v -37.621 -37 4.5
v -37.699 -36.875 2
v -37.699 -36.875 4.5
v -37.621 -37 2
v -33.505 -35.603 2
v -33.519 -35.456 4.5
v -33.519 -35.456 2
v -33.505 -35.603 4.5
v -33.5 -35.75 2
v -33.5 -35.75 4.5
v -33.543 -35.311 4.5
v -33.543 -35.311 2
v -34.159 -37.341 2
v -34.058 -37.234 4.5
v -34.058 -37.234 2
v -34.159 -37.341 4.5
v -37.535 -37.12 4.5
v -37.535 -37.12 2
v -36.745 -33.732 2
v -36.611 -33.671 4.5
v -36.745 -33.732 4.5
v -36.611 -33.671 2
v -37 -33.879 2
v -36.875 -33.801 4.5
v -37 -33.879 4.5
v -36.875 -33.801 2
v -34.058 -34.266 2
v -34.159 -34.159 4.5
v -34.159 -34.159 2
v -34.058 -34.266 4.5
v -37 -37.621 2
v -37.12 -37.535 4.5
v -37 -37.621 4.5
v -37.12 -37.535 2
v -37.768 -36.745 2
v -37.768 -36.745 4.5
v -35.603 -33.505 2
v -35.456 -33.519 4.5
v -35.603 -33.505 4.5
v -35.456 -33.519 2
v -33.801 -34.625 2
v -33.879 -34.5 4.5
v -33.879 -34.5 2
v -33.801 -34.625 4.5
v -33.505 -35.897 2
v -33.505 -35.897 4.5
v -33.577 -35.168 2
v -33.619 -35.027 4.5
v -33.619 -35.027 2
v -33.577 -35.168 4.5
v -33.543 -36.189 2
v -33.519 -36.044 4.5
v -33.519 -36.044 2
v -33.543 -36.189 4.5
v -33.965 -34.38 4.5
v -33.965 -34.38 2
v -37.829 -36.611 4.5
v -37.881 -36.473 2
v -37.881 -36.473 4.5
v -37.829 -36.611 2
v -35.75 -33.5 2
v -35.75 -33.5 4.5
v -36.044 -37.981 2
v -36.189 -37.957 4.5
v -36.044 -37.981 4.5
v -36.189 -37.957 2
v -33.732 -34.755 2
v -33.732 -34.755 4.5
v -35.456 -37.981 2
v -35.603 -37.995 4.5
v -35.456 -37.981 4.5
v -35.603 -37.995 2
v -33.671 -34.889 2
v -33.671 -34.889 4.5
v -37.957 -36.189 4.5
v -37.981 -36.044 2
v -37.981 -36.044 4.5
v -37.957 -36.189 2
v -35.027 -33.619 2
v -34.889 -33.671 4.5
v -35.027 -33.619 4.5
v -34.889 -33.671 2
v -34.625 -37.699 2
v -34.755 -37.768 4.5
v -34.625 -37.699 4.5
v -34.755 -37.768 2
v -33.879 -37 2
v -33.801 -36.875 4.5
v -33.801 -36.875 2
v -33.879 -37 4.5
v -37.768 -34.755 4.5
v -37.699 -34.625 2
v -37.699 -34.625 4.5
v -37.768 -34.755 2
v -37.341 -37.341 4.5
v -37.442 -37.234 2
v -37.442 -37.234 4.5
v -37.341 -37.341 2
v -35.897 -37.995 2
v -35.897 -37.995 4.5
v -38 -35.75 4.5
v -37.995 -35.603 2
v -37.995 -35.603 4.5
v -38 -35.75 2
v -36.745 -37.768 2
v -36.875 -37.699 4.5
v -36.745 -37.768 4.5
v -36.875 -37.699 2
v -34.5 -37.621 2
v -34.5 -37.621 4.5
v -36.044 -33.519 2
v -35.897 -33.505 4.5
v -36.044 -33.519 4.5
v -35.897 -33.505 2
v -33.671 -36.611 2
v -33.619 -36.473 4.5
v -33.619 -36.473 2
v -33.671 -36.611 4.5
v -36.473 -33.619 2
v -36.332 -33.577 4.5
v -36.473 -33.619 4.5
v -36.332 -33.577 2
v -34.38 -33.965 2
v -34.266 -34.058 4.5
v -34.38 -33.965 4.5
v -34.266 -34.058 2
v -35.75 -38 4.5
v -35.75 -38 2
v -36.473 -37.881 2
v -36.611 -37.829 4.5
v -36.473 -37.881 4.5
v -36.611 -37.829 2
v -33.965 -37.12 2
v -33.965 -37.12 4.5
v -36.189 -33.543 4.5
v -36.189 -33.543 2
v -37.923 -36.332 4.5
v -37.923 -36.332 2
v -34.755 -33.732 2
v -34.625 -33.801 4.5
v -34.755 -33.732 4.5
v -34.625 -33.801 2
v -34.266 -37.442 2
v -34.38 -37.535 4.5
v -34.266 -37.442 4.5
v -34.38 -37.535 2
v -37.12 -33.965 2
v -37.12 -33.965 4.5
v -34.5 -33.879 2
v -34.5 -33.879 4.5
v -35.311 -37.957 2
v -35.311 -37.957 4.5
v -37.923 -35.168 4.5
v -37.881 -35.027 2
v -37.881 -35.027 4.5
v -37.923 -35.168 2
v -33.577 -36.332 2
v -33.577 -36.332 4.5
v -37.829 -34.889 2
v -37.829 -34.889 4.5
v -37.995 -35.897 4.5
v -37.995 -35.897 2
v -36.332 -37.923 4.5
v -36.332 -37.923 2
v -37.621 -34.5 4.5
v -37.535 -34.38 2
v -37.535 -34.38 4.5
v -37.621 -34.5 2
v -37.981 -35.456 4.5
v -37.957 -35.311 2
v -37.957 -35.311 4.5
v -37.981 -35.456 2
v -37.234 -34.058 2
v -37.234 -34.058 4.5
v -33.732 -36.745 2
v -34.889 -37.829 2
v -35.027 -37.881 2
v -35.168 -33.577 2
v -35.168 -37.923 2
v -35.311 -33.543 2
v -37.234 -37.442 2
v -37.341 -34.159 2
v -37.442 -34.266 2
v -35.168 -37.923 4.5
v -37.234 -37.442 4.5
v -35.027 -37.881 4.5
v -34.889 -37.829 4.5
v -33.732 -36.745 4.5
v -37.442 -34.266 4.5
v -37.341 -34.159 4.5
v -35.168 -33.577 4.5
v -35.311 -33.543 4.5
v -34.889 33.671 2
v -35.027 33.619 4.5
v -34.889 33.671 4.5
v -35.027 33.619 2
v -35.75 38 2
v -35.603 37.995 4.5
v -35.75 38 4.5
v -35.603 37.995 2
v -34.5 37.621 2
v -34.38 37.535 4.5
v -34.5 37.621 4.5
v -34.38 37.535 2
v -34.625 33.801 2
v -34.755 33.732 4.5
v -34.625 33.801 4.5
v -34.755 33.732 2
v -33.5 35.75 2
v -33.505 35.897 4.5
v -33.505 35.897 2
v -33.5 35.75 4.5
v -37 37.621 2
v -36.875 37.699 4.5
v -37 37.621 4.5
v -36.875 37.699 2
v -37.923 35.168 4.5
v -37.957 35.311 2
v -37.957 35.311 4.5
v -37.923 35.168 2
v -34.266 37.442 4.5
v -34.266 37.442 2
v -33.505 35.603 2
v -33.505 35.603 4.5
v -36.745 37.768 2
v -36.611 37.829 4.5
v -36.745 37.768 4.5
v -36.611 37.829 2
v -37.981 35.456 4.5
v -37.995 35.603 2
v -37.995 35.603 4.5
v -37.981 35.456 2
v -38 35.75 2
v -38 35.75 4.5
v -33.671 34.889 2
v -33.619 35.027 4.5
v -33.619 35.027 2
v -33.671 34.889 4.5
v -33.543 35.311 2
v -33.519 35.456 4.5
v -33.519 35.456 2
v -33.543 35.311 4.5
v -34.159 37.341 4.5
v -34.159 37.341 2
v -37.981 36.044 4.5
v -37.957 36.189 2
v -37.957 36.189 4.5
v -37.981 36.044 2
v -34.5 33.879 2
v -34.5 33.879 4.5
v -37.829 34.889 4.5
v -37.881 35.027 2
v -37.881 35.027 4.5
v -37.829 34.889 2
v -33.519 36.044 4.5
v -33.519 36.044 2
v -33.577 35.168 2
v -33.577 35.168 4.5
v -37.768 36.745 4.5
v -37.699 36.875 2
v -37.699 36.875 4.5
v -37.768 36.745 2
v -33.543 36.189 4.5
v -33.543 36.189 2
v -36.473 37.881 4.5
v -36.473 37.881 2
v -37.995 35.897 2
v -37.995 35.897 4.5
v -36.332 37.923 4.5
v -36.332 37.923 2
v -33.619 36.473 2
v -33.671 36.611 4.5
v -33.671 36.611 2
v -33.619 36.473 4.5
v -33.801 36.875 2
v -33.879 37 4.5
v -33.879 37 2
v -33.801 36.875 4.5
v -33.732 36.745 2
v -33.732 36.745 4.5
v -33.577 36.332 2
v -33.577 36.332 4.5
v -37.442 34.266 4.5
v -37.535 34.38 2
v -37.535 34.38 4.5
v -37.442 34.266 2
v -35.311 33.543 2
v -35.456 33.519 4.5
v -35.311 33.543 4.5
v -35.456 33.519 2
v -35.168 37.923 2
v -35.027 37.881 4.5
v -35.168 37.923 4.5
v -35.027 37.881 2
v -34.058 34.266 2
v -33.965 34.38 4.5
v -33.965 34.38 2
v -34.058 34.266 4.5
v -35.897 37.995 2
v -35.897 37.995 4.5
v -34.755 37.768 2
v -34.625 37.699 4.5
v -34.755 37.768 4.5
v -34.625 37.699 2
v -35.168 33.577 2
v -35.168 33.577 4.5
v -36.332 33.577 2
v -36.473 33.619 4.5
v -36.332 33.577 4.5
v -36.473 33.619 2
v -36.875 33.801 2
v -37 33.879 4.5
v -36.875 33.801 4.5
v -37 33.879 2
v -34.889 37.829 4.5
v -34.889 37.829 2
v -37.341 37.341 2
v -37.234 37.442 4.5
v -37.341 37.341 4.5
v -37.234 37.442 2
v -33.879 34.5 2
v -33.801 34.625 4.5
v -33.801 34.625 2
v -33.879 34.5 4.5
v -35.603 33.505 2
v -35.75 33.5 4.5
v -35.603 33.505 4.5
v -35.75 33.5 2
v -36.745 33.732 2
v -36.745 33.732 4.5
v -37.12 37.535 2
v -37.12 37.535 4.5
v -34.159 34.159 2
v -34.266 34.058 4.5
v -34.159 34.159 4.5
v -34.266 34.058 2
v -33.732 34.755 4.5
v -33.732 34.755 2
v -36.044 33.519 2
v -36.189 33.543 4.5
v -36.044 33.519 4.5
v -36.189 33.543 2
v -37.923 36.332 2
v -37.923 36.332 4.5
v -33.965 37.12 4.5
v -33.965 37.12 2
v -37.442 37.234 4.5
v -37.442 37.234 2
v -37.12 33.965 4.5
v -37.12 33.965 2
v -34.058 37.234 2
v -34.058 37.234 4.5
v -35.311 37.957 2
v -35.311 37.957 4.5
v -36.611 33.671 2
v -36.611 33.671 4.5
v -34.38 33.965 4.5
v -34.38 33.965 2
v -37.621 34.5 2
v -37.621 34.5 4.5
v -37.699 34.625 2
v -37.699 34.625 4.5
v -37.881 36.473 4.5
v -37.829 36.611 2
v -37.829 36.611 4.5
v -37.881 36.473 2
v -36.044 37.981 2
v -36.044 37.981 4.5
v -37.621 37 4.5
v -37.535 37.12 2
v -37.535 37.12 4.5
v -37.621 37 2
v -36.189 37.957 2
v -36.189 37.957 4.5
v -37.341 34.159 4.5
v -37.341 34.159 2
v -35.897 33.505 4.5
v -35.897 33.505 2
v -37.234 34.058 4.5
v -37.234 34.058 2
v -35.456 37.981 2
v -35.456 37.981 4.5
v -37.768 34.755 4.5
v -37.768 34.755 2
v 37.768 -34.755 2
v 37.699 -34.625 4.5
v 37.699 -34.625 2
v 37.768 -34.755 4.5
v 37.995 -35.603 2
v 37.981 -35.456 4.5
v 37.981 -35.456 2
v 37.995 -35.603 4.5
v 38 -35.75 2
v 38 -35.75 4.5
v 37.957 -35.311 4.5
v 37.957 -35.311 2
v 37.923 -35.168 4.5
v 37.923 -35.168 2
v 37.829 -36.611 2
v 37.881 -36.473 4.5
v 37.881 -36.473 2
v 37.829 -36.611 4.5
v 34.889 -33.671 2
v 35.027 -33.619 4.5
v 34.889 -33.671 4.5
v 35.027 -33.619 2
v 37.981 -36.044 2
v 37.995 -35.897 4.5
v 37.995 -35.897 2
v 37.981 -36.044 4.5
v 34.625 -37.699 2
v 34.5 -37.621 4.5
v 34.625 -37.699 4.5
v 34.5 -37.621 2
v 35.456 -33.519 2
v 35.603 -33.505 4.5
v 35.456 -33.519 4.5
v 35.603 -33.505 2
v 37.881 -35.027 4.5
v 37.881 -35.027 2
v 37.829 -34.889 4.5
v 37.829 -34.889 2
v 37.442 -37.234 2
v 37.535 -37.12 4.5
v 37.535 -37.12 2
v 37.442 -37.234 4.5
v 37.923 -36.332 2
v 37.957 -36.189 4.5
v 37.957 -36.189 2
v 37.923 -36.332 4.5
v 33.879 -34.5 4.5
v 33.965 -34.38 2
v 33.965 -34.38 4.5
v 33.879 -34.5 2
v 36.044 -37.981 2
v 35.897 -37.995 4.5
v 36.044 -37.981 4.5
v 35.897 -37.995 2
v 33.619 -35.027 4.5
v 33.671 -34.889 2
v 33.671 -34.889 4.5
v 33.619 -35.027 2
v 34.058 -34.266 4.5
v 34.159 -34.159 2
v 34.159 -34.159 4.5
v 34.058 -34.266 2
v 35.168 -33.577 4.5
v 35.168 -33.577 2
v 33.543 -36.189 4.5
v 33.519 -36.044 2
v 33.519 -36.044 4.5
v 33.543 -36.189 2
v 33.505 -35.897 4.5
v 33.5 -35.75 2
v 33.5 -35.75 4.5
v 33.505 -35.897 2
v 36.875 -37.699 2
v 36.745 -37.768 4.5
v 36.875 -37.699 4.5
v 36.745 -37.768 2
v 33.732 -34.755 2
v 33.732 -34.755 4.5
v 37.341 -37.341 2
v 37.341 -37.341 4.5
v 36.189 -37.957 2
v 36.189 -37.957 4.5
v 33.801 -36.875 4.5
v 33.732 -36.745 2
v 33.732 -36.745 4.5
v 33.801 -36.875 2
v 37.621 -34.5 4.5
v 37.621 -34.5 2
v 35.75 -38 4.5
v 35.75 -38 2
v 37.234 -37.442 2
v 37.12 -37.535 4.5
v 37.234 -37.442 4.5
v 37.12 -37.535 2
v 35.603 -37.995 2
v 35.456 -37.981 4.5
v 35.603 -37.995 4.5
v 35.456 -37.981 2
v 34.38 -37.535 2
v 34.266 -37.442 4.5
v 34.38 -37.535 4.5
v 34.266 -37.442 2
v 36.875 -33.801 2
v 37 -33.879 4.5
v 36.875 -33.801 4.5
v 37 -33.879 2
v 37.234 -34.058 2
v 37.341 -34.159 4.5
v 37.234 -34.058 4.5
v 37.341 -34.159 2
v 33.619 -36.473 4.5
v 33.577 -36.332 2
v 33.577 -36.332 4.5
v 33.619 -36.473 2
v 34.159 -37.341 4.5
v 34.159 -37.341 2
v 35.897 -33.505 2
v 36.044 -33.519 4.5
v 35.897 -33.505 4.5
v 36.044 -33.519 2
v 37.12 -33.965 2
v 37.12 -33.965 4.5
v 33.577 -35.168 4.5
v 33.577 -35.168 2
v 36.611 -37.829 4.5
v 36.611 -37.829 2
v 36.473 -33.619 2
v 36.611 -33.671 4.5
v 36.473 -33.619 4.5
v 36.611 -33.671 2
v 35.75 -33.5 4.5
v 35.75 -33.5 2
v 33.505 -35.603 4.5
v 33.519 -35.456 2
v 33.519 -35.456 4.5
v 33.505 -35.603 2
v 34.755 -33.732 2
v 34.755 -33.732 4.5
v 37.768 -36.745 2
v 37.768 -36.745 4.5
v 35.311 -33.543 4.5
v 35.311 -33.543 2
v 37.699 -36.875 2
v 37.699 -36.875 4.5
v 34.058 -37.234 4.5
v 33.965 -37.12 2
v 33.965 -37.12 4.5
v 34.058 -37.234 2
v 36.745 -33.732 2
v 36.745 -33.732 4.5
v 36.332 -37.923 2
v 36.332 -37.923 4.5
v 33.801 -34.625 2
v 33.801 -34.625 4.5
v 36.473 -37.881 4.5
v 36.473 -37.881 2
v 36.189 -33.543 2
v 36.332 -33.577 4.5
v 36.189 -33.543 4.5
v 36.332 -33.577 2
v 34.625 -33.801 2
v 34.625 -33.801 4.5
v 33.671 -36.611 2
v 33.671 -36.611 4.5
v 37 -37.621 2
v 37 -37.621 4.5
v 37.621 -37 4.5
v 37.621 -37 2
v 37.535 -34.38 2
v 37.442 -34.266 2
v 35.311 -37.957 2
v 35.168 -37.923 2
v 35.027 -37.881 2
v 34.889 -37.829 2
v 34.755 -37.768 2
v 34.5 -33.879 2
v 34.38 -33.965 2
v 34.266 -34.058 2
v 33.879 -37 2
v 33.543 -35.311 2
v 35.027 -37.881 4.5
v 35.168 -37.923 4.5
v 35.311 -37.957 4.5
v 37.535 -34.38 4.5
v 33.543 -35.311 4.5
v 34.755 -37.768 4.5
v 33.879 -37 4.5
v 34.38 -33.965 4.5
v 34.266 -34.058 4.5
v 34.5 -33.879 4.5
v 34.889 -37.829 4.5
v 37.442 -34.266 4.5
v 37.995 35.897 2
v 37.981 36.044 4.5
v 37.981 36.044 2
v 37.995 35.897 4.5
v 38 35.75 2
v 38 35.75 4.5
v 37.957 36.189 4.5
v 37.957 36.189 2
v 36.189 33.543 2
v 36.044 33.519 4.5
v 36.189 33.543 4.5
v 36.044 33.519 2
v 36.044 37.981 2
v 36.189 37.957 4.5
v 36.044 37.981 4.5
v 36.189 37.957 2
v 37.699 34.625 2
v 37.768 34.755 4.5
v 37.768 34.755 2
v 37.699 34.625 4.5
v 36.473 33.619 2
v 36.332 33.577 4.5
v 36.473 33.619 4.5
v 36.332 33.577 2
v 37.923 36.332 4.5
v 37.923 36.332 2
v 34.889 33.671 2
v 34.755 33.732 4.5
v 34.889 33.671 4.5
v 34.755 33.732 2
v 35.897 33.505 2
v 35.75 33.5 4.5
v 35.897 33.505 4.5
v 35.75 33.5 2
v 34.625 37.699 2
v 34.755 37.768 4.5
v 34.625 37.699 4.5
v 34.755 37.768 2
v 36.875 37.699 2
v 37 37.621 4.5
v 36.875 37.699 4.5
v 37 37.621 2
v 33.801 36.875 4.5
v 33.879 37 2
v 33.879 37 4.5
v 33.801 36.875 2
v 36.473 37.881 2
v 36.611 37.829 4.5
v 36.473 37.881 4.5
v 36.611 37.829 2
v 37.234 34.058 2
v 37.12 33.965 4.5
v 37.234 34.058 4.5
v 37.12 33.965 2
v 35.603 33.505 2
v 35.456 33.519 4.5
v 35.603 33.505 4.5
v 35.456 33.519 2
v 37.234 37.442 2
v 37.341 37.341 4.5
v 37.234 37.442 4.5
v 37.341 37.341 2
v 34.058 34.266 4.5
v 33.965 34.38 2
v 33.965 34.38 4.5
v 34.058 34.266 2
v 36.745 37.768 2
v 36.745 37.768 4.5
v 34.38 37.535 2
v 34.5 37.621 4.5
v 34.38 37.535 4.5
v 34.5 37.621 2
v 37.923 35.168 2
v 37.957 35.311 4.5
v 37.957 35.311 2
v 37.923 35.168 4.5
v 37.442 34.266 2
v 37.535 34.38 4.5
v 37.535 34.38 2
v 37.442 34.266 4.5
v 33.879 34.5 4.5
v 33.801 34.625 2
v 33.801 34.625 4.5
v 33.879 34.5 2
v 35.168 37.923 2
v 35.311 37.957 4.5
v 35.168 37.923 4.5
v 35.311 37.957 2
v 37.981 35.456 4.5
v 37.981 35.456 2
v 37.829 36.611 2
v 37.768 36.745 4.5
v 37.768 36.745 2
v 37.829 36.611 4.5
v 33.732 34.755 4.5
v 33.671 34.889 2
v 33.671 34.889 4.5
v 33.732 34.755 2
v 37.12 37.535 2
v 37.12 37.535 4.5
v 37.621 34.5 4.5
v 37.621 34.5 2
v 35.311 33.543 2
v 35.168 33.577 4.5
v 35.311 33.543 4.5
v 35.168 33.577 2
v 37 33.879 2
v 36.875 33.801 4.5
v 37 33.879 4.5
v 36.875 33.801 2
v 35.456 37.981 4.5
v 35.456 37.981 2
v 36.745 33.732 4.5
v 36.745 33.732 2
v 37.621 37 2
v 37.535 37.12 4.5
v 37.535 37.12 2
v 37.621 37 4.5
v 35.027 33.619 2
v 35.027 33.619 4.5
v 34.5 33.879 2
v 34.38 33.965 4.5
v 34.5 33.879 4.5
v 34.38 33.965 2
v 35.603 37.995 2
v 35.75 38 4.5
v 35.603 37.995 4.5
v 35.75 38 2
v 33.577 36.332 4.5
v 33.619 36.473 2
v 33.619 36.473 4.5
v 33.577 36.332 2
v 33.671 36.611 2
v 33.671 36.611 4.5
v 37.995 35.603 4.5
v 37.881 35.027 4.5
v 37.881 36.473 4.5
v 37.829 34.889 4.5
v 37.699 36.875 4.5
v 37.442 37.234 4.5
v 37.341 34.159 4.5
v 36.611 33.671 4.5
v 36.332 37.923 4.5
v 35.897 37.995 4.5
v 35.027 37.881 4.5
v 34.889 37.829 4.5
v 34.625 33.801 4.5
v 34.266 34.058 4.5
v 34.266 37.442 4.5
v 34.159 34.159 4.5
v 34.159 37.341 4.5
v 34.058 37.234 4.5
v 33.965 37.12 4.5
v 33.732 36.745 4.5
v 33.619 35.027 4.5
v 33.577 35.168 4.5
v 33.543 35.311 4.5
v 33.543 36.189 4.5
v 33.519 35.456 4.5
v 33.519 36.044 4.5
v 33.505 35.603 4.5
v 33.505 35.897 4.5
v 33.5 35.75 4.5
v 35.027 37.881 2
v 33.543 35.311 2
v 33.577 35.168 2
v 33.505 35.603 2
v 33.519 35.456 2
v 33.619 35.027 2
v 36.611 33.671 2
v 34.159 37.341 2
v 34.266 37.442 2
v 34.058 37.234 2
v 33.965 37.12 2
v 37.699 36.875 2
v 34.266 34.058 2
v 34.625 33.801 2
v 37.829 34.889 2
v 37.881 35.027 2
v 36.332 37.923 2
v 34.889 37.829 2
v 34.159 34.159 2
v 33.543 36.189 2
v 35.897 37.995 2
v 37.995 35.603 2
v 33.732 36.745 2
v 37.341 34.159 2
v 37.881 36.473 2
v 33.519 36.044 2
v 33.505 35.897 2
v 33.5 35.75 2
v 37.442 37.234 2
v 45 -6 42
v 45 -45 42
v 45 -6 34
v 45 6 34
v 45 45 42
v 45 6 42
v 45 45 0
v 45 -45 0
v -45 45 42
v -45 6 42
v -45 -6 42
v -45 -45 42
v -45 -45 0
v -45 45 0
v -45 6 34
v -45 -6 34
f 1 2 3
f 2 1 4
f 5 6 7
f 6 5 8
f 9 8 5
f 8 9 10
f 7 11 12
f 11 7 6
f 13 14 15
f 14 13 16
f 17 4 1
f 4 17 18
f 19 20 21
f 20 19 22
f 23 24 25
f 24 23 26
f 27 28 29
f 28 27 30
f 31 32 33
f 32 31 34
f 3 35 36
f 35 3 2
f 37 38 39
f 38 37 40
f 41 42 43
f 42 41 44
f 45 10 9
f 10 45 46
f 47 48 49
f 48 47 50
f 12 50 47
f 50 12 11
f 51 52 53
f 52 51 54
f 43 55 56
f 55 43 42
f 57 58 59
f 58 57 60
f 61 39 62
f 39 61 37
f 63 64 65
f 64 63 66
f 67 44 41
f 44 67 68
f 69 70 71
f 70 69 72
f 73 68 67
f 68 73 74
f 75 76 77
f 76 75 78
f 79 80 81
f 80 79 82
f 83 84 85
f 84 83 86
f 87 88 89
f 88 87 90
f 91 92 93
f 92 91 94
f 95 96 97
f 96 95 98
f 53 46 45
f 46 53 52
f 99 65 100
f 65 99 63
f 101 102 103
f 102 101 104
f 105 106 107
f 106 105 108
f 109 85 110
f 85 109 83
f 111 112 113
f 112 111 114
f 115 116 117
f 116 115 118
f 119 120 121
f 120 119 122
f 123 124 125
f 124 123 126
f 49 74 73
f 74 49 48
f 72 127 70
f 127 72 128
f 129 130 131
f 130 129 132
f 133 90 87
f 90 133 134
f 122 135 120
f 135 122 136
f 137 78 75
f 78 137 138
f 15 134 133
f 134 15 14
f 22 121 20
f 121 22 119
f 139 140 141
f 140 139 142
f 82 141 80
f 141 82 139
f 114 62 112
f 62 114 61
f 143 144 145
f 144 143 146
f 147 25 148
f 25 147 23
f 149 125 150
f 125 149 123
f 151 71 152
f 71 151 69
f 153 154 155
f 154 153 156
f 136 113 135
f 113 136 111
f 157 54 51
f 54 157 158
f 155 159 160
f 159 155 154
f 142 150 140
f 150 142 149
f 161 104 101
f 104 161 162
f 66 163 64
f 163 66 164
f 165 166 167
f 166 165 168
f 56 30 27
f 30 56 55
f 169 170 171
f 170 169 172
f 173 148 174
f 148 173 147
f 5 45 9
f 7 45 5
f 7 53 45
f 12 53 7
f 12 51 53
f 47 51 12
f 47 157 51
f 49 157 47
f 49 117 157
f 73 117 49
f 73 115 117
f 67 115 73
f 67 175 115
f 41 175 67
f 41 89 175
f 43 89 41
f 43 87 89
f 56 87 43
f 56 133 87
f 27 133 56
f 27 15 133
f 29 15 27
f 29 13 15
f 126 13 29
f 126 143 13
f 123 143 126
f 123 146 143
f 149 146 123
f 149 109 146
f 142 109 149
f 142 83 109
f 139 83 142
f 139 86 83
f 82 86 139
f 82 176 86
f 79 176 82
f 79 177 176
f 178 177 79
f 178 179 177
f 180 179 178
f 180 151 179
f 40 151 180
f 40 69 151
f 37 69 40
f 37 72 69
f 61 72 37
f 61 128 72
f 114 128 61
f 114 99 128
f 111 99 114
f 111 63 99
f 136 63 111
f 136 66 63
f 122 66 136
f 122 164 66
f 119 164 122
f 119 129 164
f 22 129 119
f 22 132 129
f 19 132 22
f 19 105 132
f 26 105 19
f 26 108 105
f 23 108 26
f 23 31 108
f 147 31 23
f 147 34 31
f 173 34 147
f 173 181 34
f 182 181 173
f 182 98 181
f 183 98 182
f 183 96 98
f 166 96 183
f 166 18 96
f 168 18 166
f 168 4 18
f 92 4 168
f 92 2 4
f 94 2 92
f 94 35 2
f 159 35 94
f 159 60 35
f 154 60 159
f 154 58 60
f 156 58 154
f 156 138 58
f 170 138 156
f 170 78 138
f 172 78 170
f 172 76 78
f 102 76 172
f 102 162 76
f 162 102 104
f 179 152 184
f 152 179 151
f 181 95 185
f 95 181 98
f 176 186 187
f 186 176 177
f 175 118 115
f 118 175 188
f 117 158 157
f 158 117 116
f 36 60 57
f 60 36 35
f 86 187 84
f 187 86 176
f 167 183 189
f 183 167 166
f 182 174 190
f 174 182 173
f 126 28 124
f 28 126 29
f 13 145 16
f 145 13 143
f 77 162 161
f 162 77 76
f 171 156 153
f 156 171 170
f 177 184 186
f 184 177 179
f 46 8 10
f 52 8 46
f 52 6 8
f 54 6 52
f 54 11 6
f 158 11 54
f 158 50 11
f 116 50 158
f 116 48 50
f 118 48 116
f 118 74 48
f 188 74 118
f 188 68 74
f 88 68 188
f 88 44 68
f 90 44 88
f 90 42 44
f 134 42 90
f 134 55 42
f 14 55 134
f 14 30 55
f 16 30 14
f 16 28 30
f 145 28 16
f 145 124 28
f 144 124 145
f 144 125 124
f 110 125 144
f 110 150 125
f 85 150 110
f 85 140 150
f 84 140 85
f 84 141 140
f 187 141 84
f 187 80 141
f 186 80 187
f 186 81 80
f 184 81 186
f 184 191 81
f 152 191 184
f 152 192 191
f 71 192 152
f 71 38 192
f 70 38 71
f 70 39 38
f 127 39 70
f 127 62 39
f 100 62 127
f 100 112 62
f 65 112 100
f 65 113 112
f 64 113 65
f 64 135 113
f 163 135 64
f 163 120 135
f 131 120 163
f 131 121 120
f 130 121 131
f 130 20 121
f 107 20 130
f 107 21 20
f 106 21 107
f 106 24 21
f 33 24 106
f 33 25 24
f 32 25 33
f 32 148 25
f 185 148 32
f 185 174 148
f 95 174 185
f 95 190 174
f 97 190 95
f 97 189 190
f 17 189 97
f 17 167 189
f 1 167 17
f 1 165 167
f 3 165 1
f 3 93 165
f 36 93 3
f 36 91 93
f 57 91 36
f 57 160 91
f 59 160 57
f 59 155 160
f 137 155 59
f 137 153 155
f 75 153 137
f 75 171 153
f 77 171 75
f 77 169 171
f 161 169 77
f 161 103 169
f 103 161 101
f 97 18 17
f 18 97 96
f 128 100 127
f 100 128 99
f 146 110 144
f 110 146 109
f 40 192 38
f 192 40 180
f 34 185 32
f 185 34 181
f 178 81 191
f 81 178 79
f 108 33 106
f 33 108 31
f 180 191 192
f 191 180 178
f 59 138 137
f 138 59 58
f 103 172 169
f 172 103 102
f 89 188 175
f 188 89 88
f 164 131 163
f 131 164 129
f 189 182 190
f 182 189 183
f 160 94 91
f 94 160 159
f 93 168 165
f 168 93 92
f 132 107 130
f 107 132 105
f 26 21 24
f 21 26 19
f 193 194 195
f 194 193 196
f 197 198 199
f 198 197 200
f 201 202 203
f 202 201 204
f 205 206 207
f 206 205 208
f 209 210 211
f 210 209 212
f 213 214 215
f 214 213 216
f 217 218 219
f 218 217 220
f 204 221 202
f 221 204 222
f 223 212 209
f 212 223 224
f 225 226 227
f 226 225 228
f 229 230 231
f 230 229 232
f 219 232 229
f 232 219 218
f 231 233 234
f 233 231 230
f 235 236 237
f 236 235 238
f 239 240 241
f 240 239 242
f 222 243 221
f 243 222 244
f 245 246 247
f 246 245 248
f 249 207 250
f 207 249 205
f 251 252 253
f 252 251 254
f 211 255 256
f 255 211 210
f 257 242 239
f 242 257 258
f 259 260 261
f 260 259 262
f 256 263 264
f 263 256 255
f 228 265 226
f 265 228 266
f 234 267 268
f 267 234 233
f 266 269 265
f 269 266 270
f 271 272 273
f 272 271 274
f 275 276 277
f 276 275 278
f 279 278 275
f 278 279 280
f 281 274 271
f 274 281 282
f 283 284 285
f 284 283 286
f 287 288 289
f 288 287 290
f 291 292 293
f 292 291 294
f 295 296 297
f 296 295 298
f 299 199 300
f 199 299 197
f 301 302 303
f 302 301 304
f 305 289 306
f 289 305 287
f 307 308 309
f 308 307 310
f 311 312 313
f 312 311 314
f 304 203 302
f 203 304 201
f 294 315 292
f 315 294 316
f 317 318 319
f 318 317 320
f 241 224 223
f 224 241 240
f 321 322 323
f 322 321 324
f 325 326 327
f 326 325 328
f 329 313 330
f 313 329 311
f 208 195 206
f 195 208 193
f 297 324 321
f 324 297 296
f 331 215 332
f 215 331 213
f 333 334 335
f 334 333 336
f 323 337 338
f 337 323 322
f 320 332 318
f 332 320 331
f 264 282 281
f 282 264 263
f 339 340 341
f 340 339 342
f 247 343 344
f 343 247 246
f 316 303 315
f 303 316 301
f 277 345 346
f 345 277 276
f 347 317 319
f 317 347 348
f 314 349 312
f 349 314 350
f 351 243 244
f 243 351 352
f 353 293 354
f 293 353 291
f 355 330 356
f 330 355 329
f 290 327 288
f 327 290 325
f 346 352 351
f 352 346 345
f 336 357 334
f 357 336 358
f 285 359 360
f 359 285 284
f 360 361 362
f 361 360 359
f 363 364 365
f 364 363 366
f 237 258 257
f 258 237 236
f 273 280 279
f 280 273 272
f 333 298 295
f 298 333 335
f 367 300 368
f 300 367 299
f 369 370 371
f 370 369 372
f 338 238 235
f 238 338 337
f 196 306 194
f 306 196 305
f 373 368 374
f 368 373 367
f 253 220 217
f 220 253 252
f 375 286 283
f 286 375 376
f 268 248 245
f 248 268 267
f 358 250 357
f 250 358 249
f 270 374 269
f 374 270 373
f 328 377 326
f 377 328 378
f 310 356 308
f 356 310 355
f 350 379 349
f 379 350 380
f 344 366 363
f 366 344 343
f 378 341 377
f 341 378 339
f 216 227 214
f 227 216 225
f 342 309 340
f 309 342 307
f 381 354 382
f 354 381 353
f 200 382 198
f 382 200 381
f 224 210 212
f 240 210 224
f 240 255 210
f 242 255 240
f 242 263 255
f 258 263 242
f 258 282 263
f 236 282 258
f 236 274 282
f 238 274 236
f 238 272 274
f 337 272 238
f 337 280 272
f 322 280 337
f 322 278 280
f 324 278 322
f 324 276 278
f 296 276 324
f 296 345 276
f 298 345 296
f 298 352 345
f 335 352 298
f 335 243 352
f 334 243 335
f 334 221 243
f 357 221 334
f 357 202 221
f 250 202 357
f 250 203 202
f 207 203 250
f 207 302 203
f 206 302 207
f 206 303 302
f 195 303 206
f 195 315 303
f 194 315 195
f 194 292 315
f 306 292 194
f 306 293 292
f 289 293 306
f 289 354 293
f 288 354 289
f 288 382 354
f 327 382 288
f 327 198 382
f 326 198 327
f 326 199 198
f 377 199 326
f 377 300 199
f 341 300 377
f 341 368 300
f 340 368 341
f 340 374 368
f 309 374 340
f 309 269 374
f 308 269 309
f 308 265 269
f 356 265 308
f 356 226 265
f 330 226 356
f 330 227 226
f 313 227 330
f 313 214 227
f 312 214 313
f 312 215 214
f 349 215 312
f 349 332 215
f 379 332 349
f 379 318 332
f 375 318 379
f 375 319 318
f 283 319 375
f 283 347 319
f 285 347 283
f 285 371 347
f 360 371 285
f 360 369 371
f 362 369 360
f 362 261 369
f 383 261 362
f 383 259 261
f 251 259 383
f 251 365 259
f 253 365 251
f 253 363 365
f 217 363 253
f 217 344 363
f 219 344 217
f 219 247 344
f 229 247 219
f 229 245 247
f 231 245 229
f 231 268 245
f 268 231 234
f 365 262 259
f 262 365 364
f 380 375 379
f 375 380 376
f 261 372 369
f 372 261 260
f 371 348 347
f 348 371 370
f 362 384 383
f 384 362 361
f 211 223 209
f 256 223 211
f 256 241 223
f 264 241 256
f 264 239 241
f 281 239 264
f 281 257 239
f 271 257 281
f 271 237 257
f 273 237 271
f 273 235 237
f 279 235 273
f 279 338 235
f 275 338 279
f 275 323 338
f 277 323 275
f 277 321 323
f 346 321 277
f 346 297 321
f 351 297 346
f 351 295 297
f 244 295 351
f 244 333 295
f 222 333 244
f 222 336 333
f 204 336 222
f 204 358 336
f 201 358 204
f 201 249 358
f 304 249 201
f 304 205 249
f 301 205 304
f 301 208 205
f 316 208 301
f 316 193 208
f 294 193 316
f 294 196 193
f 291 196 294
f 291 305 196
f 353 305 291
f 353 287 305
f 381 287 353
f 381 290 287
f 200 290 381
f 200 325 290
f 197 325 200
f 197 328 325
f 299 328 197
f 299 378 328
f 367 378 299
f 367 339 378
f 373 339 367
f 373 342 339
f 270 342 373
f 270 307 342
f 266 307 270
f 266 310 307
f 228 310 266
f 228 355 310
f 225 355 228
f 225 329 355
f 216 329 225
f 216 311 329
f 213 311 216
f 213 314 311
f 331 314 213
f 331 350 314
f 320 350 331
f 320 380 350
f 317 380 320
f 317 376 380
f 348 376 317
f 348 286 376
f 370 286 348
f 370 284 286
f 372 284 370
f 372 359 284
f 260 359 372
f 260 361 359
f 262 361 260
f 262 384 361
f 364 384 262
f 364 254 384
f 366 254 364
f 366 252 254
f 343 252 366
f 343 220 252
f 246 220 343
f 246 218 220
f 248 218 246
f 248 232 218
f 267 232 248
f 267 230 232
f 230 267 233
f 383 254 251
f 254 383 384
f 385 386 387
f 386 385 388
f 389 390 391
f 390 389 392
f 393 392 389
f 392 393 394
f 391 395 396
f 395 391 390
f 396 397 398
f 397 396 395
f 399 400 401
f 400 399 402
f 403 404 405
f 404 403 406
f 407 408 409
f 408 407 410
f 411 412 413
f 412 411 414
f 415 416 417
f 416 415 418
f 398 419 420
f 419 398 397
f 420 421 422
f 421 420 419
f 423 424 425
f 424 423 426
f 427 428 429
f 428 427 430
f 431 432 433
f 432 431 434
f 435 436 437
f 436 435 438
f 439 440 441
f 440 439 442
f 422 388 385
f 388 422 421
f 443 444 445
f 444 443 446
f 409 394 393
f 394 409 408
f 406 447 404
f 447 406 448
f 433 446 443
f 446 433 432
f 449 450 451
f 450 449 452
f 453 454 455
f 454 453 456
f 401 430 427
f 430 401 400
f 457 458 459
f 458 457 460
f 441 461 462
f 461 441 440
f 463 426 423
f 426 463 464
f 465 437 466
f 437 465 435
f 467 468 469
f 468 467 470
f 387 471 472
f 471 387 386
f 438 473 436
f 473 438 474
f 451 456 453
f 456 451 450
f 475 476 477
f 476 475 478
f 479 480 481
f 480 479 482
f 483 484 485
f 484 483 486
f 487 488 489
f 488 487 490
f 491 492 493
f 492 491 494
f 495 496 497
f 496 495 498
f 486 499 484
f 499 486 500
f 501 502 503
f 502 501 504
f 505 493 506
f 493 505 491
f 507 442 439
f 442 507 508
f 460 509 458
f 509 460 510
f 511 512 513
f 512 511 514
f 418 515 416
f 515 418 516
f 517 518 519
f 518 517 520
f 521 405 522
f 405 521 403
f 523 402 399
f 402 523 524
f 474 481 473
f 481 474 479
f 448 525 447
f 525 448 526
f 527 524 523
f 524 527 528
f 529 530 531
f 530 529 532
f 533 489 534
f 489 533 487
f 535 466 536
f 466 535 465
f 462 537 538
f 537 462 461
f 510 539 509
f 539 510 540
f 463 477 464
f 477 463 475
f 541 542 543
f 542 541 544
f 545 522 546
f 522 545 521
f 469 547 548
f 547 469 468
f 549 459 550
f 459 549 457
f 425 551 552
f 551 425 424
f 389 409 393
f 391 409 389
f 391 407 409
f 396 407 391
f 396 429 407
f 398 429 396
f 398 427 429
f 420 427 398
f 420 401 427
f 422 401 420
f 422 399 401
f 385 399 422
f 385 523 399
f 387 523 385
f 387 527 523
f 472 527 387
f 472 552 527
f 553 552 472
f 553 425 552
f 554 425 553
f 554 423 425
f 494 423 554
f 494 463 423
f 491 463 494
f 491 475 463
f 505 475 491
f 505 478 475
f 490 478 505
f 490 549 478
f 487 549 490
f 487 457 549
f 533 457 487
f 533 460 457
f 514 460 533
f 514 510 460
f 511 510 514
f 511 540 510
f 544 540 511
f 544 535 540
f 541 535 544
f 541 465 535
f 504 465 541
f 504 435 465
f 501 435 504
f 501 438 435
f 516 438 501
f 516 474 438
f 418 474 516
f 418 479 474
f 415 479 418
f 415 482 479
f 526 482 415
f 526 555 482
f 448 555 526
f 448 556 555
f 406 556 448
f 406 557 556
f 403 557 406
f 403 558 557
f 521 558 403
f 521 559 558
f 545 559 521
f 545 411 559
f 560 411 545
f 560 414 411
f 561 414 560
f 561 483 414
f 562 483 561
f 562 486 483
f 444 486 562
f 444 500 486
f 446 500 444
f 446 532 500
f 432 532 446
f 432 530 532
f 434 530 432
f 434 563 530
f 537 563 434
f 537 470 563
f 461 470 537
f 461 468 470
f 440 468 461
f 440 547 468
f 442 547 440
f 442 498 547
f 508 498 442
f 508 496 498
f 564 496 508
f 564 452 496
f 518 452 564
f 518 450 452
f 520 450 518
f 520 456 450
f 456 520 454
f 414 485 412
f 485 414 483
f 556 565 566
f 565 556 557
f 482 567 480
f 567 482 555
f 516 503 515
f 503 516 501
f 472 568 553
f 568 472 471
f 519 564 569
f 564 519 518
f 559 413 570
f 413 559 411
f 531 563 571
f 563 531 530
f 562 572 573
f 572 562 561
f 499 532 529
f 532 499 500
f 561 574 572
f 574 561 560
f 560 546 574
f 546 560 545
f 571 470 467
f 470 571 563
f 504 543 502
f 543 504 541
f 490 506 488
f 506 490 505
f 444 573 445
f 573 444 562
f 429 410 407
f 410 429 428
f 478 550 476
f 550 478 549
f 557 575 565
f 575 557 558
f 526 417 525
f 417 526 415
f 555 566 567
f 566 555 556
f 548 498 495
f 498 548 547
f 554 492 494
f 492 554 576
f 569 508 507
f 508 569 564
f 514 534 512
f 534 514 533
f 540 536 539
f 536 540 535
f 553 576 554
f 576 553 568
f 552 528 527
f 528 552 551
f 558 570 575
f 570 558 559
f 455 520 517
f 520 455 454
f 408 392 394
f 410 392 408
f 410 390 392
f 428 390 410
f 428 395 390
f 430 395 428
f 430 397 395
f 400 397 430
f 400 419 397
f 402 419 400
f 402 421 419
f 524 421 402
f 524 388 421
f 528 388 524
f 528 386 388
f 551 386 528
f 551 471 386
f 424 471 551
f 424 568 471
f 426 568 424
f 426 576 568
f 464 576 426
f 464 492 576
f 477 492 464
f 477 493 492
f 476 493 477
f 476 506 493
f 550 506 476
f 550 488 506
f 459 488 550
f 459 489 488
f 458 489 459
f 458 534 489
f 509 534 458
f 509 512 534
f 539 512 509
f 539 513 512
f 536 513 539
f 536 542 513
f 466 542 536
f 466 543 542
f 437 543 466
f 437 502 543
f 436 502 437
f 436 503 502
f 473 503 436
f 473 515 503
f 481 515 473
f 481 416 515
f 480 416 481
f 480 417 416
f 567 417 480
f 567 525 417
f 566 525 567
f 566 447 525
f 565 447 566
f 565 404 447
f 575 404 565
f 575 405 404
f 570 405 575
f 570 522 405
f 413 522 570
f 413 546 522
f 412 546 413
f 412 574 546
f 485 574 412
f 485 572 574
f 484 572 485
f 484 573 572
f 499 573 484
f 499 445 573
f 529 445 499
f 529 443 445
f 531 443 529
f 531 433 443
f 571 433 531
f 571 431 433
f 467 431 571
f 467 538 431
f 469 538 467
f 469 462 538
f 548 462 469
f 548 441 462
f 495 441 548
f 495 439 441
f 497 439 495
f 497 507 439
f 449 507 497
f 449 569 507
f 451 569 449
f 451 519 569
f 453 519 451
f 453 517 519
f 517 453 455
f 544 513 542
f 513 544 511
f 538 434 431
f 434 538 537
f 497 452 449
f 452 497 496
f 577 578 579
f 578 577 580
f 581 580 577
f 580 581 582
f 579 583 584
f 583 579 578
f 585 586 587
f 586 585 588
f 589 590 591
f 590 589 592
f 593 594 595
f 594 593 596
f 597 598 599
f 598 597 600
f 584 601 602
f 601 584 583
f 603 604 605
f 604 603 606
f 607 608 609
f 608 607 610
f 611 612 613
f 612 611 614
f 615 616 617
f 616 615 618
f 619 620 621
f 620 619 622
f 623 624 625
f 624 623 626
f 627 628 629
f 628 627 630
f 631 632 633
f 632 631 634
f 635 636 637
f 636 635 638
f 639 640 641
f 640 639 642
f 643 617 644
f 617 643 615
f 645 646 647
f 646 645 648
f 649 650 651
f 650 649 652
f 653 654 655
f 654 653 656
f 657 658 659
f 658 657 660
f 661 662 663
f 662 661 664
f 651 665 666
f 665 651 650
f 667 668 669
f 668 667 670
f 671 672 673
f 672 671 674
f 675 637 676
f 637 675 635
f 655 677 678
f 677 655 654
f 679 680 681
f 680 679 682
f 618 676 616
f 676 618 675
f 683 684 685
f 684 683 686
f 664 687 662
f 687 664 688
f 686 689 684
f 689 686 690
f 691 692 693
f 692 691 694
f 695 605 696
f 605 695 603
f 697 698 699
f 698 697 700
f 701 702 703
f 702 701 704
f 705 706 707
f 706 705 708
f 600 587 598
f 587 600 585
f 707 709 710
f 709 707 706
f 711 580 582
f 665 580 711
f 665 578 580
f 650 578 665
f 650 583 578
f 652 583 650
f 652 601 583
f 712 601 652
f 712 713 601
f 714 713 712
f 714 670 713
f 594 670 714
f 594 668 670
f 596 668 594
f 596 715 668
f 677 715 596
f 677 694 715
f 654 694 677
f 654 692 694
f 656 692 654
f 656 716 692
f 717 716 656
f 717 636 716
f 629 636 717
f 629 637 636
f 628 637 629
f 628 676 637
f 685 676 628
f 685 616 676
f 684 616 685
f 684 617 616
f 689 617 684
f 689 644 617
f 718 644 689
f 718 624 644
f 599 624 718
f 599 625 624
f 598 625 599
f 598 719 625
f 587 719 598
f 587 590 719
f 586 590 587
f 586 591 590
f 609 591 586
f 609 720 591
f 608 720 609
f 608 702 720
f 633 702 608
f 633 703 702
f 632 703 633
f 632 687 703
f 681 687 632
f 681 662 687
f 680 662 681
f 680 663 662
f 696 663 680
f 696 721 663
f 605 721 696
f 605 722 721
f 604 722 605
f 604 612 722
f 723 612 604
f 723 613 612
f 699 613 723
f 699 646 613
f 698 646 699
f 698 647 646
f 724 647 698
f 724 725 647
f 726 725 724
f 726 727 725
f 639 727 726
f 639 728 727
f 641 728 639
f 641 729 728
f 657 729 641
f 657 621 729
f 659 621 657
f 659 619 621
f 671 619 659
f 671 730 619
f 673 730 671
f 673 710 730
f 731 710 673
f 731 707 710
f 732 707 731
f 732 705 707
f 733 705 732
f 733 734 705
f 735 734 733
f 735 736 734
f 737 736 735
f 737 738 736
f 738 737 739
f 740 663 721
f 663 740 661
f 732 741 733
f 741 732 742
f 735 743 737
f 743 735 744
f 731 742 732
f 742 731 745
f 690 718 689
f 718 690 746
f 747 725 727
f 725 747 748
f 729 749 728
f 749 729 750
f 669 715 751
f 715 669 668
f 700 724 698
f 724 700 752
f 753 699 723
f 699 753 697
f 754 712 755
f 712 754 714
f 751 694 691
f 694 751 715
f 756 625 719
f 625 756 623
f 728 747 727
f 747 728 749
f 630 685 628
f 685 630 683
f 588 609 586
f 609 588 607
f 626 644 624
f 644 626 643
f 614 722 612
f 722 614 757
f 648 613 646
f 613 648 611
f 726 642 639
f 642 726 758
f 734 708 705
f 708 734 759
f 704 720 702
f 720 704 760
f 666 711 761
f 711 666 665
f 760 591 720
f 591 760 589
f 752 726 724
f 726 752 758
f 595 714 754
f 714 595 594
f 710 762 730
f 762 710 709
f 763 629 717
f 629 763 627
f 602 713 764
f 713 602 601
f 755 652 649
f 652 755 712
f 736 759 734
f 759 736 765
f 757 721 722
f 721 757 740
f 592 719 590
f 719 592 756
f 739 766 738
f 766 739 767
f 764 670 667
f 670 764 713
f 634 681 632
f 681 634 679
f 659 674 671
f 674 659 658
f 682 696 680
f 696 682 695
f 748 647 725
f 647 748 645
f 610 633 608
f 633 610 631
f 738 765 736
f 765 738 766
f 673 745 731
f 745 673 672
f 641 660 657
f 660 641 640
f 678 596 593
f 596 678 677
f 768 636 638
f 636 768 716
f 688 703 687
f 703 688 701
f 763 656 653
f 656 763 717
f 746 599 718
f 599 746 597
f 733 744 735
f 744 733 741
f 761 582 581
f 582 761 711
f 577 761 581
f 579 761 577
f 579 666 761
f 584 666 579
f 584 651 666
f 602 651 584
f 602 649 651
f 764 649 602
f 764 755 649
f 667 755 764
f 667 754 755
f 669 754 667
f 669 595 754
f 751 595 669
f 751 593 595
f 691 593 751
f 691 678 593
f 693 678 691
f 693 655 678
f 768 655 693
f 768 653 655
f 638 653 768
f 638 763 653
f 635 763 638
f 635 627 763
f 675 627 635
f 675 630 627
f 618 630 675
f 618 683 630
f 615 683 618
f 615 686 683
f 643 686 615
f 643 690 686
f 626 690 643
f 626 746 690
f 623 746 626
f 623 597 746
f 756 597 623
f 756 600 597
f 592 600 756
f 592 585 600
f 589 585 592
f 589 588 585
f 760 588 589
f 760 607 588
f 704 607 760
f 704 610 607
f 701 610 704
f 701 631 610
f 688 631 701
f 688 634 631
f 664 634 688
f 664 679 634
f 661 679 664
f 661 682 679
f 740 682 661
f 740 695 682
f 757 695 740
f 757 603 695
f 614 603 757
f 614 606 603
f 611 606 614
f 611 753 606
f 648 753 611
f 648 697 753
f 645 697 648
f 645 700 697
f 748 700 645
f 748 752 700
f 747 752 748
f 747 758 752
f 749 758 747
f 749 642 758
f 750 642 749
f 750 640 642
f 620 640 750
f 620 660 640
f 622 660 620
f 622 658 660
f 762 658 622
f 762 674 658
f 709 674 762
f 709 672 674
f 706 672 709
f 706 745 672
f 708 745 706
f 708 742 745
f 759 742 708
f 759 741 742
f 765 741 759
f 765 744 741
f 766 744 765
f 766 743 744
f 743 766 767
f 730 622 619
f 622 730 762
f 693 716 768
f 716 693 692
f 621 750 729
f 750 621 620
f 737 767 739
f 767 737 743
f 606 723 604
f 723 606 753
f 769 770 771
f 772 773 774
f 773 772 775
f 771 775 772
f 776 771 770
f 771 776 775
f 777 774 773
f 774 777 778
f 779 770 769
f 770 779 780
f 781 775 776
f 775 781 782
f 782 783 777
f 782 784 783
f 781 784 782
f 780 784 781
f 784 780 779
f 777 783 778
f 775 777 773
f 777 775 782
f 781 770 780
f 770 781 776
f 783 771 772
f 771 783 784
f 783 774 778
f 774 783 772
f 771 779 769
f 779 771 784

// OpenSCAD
// Magnetic stirrer housing for 80 mm PC case fan
// Print orientation: top plate on bed (z = 0), walls rise to z = 40, open top

// ---------- Parameters ----------
fan_d        = 80;    // fan diameter
outer_x      = 90;    // outer size in X
outer_y      = 90;    // outer size in Y
wall         = 2.5;   // wall thickness
top_t        = 2;     // top plate thickness
open_h       = 40;    // height of open box (from top plate up)
screw_d      = 4.5;   // M4 screw hole diameter
screw_pitch  = 71.5;  // square pattern side for screw holes
notch_w      = 12;    // cable notch width
notch_depth  = 8;     // cable notch depth from open edge
eps          = 0.5;   // cutter overshoot past faces

$fn = 96;

// ---------- Model ----------
difference() {
    // Solid block: top plate + walls
    translate([-outer_x/2, -outer_y/2, 0])
        cube([outer_x, outer_y, open_h + top_t]);

    // Screw holes through top plate
    for (sx = [-screw_pitch/2, screw_pitch/2])
        for (sy = [-screw_pitch/2, screw_pitch/2])
            translate([sx, sy, top_t])
                cylinder(d = screw_d, h = top_t + eps);

    // Cable notch in one wall (full cut through the wall)
    translate([-outer_x/2, -notch_w/2, open_h + top_t - notch_depth])
        cube([outer_x, notch_w, notch_depth + eps]);
}
